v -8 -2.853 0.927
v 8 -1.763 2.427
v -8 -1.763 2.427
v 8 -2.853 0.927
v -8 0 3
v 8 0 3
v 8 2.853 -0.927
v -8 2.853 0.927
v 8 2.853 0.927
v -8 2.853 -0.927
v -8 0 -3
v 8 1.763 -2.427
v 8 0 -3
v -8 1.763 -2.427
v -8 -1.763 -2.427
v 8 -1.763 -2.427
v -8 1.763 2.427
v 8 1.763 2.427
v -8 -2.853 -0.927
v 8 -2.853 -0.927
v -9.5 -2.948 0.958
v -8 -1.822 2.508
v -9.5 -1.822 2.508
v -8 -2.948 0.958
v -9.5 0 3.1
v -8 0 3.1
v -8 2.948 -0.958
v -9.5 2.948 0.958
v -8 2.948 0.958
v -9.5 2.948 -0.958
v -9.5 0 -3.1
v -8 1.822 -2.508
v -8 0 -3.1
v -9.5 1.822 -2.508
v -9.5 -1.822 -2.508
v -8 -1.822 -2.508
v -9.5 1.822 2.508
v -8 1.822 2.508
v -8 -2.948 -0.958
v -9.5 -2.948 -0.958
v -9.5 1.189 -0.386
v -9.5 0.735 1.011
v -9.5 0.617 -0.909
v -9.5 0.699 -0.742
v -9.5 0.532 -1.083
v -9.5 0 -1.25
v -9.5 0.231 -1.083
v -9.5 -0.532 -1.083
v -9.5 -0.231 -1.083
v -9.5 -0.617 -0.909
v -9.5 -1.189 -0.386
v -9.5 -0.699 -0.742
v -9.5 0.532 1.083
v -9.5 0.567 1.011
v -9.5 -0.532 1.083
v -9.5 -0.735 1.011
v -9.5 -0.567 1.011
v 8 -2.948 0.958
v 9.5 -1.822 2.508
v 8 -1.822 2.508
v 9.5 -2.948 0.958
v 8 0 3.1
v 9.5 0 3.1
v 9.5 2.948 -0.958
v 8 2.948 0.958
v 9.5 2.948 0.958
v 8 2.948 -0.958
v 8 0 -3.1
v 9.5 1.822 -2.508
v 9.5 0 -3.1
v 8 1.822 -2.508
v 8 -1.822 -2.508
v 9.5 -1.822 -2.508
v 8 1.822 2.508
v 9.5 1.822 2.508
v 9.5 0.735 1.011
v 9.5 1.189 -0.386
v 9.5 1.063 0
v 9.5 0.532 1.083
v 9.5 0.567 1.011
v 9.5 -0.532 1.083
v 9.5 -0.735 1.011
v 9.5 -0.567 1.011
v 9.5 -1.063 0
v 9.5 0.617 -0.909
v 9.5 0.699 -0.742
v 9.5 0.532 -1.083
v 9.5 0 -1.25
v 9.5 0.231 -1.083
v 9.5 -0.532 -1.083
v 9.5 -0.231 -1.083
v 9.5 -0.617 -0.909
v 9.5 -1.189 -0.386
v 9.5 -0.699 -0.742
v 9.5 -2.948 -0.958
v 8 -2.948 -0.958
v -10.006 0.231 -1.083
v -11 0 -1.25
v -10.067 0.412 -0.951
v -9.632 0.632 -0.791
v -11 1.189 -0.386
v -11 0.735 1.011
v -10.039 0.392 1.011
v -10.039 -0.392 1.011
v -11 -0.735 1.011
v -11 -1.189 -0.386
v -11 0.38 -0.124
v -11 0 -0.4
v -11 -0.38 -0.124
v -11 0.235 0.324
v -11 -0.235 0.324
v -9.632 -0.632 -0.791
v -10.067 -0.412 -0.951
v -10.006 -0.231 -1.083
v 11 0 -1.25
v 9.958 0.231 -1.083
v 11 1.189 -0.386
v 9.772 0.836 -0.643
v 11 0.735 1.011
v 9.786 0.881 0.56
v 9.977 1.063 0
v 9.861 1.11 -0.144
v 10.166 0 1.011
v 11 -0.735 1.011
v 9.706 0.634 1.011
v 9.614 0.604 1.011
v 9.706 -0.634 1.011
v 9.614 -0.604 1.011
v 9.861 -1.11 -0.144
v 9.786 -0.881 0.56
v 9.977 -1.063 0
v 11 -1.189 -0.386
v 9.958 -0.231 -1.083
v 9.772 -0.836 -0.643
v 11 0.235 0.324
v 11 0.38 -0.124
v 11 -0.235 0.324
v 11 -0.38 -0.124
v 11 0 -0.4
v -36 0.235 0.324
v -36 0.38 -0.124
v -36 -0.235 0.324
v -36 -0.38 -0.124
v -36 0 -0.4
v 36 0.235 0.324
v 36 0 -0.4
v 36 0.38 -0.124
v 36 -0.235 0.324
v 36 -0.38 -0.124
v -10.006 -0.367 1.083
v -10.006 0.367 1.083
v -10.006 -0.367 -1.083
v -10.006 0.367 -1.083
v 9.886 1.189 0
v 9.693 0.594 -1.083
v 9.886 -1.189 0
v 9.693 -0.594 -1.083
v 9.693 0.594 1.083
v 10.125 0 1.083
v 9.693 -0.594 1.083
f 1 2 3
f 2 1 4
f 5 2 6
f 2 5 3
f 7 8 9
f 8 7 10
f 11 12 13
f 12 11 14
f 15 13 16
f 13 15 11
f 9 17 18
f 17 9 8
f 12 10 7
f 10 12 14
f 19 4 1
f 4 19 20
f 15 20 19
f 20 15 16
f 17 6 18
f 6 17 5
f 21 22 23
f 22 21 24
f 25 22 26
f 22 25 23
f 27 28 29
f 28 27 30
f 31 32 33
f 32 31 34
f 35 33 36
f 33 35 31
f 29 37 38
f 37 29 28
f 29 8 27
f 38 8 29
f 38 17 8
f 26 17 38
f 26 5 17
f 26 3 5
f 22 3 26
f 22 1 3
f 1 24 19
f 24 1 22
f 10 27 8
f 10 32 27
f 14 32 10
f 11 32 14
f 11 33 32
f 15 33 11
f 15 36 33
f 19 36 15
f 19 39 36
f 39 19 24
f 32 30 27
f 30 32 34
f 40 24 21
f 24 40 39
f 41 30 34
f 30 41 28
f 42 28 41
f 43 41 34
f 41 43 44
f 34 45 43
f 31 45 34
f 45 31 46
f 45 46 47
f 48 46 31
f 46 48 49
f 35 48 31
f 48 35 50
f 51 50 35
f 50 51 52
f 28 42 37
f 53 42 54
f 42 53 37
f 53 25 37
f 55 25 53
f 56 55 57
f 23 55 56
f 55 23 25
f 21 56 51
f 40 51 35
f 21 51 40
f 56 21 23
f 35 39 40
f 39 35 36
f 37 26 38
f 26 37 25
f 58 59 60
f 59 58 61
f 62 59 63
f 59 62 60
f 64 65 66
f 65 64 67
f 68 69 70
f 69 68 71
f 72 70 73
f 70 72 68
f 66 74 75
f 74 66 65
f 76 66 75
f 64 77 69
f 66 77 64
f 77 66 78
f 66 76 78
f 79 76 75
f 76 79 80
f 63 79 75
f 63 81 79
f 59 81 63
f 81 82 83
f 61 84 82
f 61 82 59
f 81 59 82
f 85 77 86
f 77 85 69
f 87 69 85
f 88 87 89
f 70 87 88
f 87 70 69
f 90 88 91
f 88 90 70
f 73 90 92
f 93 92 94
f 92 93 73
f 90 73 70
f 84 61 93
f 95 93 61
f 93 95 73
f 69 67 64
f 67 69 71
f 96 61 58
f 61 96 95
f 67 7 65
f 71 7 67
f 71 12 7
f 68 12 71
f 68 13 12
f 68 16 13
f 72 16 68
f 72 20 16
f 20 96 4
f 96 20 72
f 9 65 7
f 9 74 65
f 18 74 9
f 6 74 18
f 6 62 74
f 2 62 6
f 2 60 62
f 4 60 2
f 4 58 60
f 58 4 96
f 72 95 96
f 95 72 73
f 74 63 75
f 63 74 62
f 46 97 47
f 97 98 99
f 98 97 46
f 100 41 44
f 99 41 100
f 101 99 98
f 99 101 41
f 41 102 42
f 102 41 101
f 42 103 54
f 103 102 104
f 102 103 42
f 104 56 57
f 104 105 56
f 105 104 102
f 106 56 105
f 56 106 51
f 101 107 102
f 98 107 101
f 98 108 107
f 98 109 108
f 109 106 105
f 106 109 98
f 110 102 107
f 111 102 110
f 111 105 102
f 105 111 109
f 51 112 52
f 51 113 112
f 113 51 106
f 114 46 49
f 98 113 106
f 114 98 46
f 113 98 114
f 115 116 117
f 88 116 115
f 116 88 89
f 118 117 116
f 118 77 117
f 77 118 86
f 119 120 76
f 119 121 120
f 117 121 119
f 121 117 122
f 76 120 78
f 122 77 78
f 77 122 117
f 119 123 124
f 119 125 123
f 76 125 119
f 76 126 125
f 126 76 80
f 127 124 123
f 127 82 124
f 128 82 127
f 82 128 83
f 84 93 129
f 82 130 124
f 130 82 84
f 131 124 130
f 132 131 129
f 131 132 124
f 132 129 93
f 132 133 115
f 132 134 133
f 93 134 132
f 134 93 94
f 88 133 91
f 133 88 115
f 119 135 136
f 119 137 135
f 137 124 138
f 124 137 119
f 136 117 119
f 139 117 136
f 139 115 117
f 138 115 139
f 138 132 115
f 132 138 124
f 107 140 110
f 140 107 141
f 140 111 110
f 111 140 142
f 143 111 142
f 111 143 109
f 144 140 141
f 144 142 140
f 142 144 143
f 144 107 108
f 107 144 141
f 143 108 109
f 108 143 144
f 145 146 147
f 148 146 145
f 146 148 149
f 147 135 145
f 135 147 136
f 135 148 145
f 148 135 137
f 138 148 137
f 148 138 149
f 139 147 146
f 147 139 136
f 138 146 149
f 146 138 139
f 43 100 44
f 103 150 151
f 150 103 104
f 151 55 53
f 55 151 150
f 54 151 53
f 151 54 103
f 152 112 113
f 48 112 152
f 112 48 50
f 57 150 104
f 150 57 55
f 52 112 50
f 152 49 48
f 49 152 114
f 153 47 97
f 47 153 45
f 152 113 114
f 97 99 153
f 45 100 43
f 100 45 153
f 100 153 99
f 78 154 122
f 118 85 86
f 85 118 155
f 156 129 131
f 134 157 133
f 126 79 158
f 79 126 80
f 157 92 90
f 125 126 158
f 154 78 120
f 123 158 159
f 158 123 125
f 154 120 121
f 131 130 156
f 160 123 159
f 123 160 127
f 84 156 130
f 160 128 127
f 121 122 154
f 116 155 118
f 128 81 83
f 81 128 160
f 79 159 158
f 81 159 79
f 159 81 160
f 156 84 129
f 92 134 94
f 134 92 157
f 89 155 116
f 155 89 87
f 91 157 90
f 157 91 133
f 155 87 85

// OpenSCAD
// Parameters
resistance_ohms = 5.6; //[2.8:11.2:0.1]
power_w = 3; //[1.5:6:0.5]
body_length_mm = 18; //[9:36:0.5]
body_diameter_mm = 6; //[3:12:0.2]
end_cap_length_mm = 1.5; //[0.75:3:0.1]
end_cap_diameter_mm = 6.2; //[3.1:12.4:0.2]
lead_exit_neck_length_mm = 1.5; //[0.75:3:0.1]
lead_exit_neck_diameter_mm = 2.5; //[1.25:5:0.1]
lead_diameter_mm = 0.8; //[0.4:1.6:0.05]
lead_length_each_side_mm = 25; //[12.5:50:1]
overlap_mm = 1; //[0.5:2:0.1]

// Resistor - complete geometry
module resistor() {
  color("DimGray") {
    // Body
    translate([0, 0, 0])
      rotate([0, 90, 0])
      cylinder(r=body_diameter_mm/2, h=body_length_mm, center=true);
    
    // End Caps
    translate([-(body_length_mm/2 + end_cap_length_mm/2 - overlap_mm), 0, 0])
      rotate([0, 90, 0])
      cylinder(r=end_cap_diameter_mm/2, h=end_cap_length_mm, center=true);
    translate([(body_length_mm/2 + end_cap_length_mm/2 - overlap_mm), 0, 0])
      rotate([0, 90, 0])
      cylinder(r=end_cap_diameter_mm/2, h=end_cap_length_mm, center=true);
    
    // Lead Exit Necks
    translate([-(body_length_mm/2 + end_cap_length_mm + lead_exit_neck_length_mm/2 - overlap_mm), 0, 0])
      rotate([0, 90, 0])
      cylinder(r=lead_exit_neck_diameter_mm/2, h=lead_exit_neck_length_mm, center=true);
    translate([(body_length_mm/2 + end_cap_length_mm + lead_exit_neck_length_mm/2 - overlap_mm), 0, 0])
      rotate([0, 90, 0])
      cylinder(r=lead_exit_neck_diameter_mm/2, h=lead_exit_neck_length_mm, center=true);
    
    // Axial Leads
    translate([-(body_length_mm/2 + end_cap_length_mm + lead_exit_neck_length_mm + lead_length_each_side_mm/2 - overlap_mm), 0, 0])
      rotate([0, 90, 0])
      cylinder(r=lead_diameter_mm/2, h=lead_length_each_side_mm, center=true);
    translate([(body_length_mm/2 + end_cap_length_mm + lead_exit_neck_length_mm + lead_length_each_side_mm/2 - overlap_mm), 0, 0])
      rotate([0, 90, 0])
      cylinder(r=lead_diameter_mm/2, h=lead_length_each_side_mm, center=true);
    
    // Fillet Spheres
    translate([-(body_length_mm/2 + end_cap_length_mm - overlap_mm), 0, 0])
      sphere(r=lead_exit_neck_diameter_mm/2, center=true);
    translate([(body_length_mm/2 + end_cap_length_mm - overlap_mm), 0, 0])
      sphere(r=lead_exit_neck_diameter_mm/2, center=true);
  }
}

// Al Clad Resistor Assembly - complete geometry
module al_clad_resistor_assembly() {
  color("Silver") {
    resistor();
    // Additional features for Al Clad Resistor Assembly can be added here
  }
}

// Al Clad Resistor - complete geometry
module al_clad_resistor() {
  color("Silver") {
    resistor();
    // Additional features for Al Clad Resistor can be added here
  }
}

// Sleeved Resistor - complete geometry
module sleeved_resistor() {
  color("DimGray") {
    resistor();
    // Additional features for Sleeved Resistor can be added here
  }
}

// Assembly
module assembly() {
  resistor();
  translate([0, 0, 0]) al_clad_resistor_assembly();
  translate([0, 0, 0]) al_clad_resistor();
  translate([0, 0, 0]) sleeved_resistor();
}

assembly();
